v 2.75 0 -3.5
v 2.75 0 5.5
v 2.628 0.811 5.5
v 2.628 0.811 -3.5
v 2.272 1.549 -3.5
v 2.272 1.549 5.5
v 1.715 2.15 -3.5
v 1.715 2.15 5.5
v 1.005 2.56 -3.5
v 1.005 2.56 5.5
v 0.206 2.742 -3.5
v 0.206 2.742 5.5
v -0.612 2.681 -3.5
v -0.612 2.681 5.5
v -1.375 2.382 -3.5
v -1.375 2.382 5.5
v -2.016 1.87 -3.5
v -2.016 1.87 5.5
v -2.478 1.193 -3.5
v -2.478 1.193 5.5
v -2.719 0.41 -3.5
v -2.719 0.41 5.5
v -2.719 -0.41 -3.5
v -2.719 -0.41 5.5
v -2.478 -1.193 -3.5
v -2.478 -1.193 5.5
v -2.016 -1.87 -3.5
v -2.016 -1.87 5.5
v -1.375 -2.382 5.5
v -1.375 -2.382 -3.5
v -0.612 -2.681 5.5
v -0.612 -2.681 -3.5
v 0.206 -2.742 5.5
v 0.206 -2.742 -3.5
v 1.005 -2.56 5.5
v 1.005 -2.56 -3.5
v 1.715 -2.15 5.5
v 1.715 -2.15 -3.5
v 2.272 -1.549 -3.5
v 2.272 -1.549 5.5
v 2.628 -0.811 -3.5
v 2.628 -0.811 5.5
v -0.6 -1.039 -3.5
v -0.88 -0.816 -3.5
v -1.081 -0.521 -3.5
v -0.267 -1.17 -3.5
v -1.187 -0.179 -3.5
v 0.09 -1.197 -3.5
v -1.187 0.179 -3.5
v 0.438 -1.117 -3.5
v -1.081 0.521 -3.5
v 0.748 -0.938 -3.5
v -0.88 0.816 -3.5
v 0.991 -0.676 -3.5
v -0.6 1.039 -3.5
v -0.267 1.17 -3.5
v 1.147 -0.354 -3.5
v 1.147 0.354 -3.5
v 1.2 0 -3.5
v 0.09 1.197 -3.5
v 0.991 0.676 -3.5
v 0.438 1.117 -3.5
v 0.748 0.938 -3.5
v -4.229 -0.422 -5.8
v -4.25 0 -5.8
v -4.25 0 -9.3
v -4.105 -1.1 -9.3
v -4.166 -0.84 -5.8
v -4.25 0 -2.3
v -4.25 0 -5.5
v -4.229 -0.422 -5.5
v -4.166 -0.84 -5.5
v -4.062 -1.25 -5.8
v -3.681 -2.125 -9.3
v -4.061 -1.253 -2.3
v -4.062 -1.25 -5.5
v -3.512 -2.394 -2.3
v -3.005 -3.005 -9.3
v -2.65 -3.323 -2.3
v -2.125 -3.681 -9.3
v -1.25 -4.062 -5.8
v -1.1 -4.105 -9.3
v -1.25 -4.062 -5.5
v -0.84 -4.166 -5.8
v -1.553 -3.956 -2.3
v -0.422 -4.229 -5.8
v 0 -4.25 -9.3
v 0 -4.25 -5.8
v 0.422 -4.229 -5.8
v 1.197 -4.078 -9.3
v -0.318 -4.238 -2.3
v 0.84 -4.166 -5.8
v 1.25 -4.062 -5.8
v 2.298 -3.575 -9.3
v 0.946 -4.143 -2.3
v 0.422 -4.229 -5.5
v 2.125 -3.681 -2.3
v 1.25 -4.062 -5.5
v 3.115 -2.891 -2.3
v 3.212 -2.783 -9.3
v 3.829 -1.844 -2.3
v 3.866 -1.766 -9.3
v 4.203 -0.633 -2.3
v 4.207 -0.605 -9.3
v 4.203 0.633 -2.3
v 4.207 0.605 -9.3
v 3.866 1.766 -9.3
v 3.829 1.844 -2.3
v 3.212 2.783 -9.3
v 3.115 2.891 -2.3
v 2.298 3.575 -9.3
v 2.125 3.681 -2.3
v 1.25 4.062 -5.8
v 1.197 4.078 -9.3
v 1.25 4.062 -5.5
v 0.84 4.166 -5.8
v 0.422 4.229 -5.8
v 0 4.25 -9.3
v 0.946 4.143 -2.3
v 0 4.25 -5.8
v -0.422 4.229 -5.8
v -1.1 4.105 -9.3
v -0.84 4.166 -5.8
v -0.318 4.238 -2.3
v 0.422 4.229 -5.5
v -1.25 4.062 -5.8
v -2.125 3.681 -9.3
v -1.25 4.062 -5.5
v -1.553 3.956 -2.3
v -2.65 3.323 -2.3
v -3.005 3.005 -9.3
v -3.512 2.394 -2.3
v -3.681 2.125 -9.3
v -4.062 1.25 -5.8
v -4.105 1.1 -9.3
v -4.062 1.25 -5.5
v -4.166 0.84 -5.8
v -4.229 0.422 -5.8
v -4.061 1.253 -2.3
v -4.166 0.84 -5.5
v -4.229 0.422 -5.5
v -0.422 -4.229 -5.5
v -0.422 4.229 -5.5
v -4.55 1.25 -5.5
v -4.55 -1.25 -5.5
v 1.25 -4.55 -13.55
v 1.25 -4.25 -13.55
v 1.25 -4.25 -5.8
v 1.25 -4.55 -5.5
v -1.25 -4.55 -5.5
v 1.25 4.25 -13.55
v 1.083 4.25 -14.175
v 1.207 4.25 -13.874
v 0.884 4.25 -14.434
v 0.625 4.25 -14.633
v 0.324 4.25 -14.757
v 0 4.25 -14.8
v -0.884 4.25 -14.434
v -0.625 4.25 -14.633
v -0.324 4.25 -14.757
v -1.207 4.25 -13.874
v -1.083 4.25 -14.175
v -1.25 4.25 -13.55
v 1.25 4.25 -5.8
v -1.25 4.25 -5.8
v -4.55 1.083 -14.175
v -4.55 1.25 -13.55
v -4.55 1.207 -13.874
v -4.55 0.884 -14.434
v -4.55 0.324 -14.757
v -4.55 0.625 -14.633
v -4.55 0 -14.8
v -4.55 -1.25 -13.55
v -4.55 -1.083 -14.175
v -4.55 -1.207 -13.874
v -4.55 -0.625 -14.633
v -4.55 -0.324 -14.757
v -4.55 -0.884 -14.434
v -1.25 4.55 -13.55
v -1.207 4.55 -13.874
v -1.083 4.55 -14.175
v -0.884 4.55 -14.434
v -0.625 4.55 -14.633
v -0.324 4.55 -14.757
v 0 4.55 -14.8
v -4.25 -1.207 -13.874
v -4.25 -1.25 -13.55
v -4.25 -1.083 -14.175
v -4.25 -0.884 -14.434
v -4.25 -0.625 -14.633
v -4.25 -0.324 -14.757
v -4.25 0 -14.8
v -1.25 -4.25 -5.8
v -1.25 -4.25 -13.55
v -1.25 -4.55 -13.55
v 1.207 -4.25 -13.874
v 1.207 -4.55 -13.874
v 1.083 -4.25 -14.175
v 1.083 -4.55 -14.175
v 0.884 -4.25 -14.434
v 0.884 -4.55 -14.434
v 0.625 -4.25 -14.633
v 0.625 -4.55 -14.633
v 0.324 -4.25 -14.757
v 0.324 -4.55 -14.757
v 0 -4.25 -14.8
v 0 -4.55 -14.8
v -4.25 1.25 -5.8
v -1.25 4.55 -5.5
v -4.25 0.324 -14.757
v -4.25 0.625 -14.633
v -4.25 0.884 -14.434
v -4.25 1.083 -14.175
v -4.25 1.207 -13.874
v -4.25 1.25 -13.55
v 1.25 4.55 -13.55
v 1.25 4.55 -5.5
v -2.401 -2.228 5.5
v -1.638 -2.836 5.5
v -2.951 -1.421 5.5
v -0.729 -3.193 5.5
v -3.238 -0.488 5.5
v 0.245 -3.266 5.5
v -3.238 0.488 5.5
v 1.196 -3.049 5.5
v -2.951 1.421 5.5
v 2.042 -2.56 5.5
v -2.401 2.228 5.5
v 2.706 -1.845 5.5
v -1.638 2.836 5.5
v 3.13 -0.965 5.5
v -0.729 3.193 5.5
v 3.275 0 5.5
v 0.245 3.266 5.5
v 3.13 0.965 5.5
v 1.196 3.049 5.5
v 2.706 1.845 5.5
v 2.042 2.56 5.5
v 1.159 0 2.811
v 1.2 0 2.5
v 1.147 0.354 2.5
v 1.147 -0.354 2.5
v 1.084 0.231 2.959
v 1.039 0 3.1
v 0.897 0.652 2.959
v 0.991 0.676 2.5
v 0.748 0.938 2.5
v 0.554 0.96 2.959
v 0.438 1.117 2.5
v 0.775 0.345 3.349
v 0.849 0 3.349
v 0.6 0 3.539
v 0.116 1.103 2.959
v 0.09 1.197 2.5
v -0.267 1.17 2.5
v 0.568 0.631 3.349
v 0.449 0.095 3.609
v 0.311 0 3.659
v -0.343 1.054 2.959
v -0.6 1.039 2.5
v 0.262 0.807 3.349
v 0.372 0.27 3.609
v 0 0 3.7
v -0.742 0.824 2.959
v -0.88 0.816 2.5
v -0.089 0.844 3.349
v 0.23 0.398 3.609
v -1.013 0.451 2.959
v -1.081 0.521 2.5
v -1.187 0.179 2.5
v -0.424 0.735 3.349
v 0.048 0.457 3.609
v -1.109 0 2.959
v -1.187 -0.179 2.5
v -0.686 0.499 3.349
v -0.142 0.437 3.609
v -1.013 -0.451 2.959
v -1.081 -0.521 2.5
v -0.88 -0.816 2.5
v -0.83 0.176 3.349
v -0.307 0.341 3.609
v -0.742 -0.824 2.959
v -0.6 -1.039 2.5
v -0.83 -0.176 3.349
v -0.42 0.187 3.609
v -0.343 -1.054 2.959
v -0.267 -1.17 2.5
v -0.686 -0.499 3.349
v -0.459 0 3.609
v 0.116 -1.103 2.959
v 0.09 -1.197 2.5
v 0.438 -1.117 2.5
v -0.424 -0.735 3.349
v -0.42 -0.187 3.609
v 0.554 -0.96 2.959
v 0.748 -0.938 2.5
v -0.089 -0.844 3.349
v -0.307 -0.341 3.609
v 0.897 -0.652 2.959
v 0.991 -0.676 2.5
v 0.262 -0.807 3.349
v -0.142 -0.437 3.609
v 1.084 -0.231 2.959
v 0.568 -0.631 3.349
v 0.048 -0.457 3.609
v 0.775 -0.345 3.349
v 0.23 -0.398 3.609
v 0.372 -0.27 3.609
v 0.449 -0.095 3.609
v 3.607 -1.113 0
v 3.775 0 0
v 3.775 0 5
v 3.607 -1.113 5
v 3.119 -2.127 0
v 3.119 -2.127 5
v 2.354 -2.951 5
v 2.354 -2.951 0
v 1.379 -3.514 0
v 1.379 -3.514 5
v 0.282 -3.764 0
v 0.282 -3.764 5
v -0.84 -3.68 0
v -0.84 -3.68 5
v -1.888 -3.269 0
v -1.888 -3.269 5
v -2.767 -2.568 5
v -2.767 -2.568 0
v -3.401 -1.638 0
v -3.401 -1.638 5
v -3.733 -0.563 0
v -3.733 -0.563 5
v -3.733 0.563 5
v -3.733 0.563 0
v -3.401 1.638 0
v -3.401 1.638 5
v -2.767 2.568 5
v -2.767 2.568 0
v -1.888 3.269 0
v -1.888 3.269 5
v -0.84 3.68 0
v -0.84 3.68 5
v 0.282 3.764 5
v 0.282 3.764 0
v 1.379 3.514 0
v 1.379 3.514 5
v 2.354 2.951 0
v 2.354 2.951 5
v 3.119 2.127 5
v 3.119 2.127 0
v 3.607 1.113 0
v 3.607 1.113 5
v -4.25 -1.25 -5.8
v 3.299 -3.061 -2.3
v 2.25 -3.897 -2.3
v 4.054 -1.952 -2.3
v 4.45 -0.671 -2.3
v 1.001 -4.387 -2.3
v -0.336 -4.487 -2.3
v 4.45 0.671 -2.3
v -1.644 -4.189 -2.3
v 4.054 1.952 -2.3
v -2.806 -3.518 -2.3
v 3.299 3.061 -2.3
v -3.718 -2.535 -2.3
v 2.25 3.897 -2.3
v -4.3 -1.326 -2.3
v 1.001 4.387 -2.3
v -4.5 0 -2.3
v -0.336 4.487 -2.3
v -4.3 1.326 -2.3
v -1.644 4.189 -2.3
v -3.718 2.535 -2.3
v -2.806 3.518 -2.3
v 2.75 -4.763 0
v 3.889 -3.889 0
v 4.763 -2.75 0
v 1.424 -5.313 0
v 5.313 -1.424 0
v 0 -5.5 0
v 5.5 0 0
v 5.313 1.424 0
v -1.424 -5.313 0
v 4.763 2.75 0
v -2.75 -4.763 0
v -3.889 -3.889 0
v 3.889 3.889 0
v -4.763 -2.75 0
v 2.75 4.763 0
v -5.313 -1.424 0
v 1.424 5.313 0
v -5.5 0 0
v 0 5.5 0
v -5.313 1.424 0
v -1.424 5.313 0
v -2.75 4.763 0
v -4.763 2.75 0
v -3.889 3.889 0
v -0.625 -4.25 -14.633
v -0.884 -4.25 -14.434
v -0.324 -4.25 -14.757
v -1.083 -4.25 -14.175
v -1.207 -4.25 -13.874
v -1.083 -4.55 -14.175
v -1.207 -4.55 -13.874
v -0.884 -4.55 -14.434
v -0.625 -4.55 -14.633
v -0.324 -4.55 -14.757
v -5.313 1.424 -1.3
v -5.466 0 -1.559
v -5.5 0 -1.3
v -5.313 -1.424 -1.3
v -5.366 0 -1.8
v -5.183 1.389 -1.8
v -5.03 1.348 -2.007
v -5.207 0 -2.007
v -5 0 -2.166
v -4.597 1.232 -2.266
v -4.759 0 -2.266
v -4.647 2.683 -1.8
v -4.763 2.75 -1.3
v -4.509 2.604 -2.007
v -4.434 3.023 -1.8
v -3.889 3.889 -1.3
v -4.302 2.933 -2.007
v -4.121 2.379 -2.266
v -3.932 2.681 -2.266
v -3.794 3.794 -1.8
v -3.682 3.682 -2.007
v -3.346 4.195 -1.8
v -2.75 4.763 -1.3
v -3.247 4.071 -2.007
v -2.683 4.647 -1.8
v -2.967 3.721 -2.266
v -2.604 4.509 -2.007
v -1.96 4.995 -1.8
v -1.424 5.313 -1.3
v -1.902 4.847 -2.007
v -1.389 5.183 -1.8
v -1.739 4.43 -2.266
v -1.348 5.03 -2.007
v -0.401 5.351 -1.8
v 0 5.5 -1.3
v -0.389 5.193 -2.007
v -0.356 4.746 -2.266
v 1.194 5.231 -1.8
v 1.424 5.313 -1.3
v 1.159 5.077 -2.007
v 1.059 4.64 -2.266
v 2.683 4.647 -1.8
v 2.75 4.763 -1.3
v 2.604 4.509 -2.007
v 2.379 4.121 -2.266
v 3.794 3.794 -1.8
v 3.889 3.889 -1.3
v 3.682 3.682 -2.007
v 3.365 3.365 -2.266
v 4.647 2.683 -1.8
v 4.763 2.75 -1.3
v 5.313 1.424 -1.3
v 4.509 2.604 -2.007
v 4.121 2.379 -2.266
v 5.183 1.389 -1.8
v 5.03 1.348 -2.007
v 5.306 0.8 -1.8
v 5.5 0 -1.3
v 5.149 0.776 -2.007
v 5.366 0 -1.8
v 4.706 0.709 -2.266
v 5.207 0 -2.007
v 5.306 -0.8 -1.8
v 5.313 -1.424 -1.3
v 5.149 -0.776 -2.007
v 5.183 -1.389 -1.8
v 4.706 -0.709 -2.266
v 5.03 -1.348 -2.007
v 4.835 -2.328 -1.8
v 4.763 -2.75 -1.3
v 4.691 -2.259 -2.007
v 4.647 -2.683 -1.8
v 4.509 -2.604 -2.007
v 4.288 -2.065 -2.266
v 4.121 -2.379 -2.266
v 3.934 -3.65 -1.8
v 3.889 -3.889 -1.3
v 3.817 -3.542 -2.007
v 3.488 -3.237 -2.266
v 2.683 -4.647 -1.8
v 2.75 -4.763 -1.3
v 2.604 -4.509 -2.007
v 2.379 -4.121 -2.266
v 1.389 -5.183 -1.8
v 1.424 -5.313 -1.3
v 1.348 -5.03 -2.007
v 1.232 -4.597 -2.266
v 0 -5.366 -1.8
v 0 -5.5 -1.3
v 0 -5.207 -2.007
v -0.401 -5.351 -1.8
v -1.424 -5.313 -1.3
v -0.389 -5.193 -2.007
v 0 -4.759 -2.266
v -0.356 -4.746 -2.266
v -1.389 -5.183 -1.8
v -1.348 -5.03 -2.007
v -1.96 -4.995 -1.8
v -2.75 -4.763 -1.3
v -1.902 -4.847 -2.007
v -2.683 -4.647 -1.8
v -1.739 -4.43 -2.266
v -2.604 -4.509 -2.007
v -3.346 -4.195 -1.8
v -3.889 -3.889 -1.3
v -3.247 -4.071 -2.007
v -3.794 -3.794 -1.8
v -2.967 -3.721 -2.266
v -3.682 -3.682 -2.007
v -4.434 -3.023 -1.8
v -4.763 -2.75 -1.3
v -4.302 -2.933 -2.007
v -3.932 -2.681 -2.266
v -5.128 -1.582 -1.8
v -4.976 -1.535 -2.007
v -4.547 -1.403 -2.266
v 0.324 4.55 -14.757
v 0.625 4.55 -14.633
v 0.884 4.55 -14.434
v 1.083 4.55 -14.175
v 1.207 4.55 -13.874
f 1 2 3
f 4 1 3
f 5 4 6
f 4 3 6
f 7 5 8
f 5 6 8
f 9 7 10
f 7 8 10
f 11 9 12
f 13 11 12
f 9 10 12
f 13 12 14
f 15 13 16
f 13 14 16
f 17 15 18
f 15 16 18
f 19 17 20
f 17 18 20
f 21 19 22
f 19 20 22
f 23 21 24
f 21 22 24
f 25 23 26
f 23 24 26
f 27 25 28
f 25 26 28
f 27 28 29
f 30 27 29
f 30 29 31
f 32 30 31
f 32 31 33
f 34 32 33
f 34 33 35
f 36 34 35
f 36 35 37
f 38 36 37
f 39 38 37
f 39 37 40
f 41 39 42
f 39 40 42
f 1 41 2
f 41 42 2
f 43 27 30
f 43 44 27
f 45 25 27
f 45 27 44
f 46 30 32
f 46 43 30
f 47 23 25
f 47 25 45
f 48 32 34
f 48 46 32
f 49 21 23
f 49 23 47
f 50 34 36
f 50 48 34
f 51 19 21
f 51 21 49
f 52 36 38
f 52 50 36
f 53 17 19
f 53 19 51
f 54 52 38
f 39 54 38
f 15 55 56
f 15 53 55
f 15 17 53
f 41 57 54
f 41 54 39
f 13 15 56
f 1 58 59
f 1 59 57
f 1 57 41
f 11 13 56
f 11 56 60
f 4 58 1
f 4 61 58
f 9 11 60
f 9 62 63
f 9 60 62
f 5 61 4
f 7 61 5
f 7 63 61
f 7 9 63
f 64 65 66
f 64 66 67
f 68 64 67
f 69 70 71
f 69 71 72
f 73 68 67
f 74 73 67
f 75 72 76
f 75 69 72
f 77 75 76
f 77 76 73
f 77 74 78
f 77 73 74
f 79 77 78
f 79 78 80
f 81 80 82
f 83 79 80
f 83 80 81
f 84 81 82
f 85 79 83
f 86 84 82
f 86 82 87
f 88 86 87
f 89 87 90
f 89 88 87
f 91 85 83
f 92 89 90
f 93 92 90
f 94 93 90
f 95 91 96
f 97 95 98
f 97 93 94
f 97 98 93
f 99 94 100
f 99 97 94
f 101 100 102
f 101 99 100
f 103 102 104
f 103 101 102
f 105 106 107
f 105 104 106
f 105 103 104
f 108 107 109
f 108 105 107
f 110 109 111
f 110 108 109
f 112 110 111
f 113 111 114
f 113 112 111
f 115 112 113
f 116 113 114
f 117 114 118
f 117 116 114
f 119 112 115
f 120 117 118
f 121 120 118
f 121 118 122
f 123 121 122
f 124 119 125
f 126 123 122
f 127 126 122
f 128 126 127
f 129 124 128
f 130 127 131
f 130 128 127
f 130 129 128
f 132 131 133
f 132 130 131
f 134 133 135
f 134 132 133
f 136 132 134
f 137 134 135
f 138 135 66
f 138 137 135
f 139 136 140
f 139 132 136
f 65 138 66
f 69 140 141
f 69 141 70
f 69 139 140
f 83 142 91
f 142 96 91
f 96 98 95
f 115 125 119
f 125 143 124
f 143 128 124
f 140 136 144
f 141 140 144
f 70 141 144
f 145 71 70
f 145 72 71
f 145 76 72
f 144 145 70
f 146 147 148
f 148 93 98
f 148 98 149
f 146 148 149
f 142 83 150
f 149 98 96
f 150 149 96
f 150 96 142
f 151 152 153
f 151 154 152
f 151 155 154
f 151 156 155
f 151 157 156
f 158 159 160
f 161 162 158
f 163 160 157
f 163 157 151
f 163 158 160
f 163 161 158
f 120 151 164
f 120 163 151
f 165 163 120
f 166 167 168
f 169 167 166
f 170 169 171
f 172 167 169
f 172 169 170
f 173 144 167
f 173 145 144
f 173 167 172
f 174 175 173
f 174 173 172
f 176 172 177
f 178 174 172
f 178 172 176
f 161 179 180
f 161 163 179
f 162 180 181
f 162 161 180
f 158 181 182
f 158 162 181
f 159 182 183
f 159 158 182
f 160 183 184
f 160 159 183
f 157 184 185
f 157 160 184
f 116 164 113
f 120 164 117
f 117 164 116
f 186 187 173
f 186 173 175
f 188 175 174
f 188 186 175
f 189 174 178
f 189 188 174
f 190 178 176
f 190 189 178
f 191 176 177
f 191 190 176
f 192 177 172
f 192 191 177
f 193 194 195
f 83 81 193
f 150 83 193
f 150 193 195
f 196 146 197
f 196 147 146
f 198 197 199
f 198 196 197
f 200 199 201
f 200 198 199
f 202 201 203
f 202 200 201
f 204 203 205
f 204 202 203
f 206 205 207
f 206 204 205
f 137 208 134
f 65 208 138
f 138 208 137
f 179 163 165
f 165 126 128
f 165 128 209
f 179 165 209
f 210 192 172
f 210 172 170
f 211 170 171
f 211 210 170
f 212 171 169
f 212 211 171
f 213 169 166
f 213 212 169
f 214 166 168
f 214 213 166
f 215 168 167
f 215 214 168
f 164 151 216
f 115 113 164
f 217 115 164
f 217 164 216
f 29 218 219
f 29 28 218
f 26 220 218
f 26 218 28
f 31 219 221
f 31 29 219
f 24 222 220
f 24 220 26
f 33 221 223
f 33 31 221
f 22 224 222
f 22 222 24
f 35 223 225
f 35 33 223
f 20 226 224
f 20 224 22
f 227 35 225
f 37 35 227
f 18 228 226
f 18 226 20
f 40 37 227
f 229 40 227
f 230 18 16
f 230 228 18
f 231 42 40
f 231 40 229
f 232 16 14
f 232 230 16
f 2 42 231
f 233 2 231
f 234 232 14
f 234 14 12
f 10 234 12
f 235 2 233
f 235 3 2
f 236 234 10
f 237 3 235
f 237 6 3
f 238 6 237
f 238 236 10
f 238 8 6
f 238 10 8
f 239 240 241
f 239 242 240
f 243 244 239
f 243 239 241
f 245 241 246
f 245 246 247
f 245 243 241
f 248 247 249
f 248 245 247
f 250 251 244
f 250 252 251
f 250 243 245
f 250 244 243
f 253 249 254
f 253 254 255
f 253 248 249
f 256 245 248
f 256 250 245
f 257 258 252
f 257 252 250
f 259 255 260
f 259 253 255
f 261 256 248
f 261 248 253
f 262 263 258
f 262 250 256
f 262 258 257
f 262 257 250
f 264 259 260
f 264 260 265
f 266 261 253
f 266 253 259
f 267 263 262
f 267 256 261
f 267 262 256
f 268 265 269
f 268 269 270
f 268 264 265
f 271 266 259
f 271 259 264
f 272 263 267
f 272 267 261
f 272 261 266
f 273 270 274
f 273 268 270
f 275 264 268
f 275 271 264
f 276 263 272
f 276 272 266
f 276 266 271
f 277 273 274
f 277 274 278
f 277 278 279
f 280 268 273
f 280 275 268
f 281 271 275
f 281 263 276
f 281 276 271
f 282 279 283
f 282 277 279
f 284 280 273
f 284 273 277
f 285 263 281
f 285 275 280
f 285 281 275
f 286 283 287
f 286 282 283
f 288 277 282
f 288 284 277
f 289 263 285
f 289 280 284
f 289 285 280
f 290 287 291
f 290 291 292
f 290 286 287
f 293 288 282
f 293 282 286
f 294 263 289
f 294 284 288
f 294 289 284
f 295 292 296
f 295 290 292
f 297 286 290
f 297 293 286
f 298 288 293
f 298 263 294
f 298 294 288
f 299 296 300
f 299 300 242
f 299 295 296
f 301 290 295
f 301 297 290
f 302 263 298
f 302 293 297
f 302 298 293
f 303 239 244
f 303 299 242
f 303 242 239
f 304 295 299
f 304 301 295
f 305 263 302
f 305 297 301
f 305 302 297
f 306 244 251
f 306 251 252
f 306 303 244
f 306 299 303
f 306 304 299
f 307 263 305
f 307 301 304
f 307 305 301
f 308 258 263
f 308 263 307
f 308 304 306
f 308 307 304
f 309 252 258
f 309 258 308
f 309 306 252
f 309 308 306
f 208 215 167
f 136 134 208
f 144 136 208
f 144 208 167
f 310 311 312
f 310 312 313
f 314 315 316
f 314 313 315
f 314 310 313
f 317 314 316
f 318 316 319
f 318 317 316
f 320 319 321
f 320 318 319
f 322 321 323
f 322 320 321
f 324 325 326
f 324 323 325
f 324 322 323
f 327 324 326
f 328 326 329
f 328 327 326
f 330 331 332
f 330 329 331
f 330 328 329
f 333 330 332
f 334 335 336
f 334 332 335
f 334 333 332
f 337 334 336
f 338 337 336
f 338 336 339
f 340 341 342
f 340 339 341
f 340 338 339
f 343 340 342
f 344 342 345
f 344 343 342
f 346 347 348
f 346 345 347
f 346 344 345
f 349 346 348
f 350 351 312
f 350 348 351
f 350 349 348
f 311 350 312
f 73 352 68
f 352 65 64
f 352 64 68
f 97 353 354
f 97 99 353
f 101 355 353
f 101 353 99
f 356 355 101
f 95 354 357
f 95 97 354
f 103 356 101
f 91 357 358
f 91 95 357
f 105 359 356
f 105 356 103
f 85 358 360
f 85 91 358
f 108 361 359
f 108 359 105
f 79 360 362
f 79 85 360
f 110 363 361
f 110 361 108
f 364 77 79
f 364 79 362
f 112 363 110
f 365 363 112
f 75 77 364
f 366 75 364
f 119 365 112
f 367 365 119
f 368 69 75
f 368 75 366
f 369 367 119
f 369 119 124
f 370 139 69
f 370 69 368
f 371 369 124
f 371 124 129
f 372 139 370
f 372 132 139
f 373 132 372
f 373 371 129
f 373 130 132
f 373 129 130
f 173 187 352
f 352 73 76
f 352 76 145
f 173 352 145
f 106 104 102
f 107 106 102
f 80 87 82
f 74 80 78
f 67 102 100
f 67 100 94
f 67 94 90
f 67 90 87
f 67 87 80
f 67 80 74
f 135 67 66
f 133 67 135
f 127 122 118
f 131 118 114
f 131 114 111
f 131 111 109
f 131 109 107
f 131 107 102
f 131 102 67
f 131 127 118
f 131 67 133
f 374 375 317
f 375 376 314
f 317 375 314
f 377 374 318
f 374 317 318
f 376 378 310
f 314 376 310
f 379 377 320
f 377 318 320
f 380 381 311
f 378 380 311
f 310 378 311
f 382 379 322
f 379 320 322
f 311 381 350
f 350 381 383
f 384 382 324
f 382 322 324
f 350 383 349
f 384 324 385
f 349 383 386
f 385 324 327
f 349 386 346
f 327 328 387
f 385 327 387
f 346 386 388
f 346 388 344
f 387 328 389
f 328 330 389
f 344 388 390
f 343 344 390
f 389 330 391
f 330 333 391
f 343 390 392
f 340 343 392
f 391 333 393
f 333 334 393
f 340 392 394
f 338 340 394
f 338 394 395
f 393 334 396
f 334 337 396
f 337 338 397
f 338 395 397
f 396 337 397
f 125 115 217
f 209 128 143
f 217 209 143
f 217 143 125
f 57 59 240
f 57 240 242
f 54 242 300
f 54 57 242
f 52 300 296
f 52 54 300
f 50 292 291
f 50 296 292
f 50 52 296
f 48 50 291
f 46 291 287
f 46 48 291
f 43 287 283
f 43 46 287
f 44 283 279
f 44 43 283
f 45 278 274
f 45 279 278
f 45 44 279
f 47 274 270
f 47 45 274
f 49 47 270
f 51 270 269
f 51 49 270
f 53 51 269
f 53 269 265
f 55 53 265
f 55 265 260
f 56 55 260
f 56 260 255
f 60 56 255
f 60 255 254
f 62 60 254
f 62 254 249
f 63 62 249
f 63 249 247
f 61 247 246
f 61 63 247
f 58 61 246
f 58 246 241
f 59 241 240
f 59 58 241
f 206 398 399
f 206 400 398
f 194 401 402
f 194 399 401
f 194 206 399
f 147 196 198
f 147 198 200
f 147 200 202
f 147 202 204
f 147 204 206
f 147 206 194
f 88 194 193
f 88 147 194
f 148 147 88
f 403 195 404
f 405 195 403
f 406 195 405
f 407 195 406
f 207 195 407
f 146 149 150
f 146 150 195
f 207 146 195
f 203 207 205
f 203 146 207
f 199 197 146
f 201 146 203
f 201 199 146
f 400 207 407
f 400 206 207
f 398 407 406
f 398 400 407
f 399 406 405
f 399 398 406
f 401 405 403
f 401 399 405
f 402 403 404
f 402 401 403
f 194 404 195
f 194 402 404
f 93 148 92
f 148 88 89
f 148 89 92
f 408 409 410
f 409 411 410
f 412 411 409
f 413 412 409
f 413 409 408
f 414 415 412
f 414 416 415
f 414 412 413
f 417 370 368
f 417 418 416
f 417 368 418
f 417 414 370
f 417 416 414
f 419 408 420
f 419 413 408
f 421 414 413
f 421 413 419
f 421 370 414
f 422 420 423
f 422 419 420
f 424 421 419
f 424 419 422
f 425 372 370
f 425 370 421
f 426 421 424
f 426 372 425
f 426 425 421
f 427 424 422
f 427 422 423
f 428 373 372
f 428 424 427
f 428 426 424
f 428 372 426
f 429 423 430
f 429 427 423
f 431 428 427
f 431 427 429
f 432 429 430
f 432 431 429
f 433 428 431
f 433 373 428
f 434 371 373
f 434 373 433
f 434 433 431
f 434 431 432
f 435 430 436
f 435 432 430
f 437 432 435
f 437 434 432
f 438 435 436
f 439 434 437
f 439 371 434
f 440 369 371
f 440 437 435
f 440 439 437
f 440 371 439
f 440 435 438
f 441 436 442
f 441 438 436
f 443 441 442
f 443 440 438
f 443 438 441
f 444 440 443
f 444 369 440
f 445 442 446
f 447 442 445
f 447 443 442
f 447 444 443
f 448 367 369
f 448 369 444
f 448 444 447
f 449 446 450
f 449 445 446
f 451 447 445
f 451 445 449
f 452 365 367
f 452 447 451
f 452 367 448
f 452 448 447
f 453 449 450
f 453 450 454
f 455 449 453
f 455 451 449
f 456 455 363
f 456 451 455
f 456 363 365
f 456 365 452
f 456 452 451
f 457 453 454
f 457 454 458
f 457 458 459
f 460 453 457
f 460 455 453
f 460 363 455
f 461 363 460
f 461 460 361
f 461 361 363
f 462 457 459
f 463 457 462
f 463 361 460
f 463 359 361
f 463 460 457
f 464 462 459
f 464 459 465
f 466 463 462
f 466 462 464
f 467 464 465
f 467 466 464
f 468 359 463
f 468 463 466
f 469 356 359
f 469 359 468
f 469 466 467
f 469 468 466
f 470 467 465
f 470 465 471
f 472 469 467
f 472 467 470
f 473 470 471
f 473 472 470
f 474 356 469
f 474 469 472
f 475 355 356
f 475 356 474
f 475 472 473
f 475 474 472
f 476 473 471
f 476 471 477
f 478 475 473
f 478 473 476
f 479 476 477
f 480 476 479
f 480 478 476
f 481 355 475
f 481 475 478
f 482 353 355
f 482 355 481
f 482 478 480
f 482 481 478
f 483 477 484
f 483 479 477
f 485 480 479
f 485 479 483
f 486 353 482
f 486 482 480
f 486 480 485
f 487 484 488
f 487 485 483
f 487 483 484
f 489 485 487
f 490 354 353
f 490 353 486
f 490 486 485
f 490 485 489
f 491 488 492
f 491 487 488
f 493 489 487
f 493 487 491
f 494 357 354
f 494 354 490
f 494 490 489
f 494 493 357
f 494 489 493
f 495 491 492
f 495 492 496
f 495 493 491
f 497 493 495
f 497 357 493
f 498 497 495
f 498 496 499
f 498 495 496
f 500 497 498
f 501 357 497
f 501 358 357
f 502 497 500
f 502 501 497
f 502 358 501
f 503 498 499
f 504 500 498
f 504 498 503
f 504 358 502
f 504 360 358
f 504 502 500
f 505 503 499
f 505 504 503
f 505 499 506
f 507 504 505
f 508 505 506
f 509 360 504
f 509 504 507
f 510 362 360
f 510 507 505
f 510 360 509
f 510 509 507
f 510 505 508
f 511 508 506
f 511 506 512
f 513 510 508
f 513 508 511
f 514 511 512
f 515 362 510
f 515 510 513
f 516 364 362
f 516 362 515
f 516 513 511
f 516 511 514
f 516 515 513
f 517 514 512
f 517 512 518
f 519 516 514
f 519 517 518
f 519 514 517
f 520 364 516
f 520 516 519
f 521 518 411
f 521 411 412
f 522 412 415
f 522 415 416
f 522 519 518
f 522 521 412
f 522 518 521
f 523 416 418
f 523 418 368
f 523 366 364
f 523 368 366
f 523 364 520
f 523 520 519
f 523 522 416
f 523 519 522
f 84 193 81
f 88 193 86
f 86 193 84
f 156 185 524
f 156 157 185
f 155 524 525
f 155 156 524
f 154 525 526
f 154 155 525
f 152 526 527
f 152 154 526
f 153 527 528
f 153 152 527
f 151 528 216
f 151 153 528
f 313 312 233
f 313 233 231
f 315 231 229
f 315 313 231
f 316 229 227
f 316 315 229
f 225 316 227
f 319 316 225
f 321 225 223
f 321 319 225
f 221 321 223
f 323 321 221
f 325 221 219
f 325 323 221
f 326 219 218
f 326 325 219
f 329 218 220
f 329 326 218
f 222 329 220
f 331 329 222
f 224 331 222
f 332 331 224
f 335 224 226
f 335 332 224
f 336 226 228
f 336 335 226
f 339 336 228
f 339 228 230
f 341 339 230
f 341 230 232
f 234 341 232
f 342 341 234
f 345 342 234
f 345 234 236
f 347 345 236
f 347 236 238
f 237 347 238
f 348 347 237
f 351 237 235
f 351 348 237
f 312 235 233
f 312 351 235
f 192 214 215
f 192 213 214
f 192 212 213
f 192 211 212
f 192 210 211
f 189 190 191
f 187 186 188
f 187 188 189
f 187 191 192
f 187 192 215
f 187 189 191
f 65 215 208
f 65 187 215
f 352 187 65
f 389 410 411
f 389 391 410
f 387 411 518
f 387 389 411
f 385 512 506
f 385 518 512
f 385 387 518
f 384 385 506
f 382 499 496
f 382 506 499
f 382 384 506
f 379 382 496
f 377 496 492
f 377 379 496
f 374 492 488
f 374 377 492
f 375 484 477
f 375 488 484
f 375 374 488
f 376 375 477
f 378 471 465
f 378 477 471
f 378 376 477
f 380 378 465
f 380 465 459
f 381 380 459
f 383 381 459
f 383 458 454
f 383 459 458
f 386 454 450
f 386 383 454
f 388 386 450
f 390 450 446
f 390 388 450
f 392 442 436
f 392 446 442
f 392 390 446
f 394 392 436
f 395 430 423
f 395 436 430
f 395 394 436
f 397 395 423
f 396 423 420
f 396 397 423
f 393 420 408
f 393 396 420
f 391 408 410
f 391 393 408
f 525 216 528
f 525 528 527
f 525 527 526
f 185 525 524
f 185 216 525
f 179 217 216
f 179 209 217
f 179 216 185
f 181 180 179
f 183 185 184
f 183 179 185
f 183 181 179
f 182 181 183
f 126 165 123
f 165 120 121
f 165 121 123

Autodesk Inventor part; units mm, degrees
ref_plane "YZ Plane" through (0, 0, 0) normal (1, 0, 0) x (0, 1, 0)
ref_plane "XZ Plane" through (0, 0, 0) normal (0, 1, 0) x (-1, 0, 0)
ref_plane "XY Plane" through (0, 0, 0) normal (0, 0, 1) x (1, 0, 0)
sketch "Esquisse1" plane through (0, 0, 0) normal (0, 0, 1) x (1, 0, 0)
  circle A0 centre (0, 0) radius 3.775
  dimension "d0" = 7.55
extrude "Extrusion1" add sketch "Esquisse1" along normal blind 5.5
sketch "Esquisse2" plane through (0, 0, 0) normal (0, 0, -1) x (-1, 0, 0)
  circle A0 centre (0, 0) radius 5.5
  dimension "d3" = 11
extrude "Extrusion2" add sketch "Esquisse2" along normal blind 2.3
sketch "Esquisse3" plane through (0, 0, -2.3) normal (0, 0, -1) x (-1, 0, 0)
  circle A0 centre (0, 0) radius 4.25
  dimension "d6" = 8.5
extrude "Extrusion3" add sketch "Esquisse3" along normal blind 7
fillet "Congé1" radius 1 1 edges at (5.5, 0, -2.3)
sketch "Esquisse4" plane through (0, 0, 5.5) normal (0, 0, 1) x (1, 0, 0)
  circle A0 centre (0, 0) radius 2.75
  dimension "d10" = 5.5
extrude "Extrusion4" cut sketch "Esquisse4" against normal blind 9
sketch "Esquisse5" plane through (0, 0, -3.5) normal (0, 0, 1) x (1, 0, 0)
  circle A0 centre (0, 0) radius 1.2
  dimension "d13" = 2.4
extrude "Extrusion5" add sketch "Esquisse5" along normal blind 7.2
fillet "Congé2" radius 1.2 1 edges at (-1.2, 0, 3.7)
thread "Filetage1" size "M8x0.5" class "6g" standard "ISO Metric profile" full length
sketch "Esquisse6" plane through (0, 0, 0) normal (1, 0, 0) x (0, 1, 0)
  line L0 (4.25, -14.8) -> (4.25, -5.8)
  line L1 (4.25, -5.8) -> (4.05, -5.8)
  line L2 (4.05, -5.8) -> (4.05, -5.5)
  line L3 (4.05, -5.5) -> (4.55, -5.5)
  line L4 (4.55, -5.5) -> (4.55, -14.8)
  line L5 (4.55, -14.8) -> (4.25, -14.8)
  line L6 (4.25, -2.3) -> (4.25, -9.3) projected
  line L7 (4.25, -2.3) -> (-4.25, -2.3) projected
  point P0 (0, 0)
  dimension "d19" = 0.3
  dimension "d20" = 0.3
  dimension "d21" = 9.3
  dimension "d22" = 3.2
  dimension "d24" = 0.2
extrude "Extrusion6" add sketch "Esquisse6" along normal mid plane 2.5
fillet "Congé3" radius 1.25 2 edges at (1.25, 4.4, -14.8) (-1.25, 4.4, -14.8)
pattern_circular "Réseau circulaire1" count 3 over 180 about axis through (0, 0, -10) along (0, 0, 1) of "Extrusion6", "Congé3"
chamfer "Chanfrein1" distance 0.5 angle 45 1 edges at (-3.775, 0, 5.5)
properties part number "Plug alimentation" material "----------"
